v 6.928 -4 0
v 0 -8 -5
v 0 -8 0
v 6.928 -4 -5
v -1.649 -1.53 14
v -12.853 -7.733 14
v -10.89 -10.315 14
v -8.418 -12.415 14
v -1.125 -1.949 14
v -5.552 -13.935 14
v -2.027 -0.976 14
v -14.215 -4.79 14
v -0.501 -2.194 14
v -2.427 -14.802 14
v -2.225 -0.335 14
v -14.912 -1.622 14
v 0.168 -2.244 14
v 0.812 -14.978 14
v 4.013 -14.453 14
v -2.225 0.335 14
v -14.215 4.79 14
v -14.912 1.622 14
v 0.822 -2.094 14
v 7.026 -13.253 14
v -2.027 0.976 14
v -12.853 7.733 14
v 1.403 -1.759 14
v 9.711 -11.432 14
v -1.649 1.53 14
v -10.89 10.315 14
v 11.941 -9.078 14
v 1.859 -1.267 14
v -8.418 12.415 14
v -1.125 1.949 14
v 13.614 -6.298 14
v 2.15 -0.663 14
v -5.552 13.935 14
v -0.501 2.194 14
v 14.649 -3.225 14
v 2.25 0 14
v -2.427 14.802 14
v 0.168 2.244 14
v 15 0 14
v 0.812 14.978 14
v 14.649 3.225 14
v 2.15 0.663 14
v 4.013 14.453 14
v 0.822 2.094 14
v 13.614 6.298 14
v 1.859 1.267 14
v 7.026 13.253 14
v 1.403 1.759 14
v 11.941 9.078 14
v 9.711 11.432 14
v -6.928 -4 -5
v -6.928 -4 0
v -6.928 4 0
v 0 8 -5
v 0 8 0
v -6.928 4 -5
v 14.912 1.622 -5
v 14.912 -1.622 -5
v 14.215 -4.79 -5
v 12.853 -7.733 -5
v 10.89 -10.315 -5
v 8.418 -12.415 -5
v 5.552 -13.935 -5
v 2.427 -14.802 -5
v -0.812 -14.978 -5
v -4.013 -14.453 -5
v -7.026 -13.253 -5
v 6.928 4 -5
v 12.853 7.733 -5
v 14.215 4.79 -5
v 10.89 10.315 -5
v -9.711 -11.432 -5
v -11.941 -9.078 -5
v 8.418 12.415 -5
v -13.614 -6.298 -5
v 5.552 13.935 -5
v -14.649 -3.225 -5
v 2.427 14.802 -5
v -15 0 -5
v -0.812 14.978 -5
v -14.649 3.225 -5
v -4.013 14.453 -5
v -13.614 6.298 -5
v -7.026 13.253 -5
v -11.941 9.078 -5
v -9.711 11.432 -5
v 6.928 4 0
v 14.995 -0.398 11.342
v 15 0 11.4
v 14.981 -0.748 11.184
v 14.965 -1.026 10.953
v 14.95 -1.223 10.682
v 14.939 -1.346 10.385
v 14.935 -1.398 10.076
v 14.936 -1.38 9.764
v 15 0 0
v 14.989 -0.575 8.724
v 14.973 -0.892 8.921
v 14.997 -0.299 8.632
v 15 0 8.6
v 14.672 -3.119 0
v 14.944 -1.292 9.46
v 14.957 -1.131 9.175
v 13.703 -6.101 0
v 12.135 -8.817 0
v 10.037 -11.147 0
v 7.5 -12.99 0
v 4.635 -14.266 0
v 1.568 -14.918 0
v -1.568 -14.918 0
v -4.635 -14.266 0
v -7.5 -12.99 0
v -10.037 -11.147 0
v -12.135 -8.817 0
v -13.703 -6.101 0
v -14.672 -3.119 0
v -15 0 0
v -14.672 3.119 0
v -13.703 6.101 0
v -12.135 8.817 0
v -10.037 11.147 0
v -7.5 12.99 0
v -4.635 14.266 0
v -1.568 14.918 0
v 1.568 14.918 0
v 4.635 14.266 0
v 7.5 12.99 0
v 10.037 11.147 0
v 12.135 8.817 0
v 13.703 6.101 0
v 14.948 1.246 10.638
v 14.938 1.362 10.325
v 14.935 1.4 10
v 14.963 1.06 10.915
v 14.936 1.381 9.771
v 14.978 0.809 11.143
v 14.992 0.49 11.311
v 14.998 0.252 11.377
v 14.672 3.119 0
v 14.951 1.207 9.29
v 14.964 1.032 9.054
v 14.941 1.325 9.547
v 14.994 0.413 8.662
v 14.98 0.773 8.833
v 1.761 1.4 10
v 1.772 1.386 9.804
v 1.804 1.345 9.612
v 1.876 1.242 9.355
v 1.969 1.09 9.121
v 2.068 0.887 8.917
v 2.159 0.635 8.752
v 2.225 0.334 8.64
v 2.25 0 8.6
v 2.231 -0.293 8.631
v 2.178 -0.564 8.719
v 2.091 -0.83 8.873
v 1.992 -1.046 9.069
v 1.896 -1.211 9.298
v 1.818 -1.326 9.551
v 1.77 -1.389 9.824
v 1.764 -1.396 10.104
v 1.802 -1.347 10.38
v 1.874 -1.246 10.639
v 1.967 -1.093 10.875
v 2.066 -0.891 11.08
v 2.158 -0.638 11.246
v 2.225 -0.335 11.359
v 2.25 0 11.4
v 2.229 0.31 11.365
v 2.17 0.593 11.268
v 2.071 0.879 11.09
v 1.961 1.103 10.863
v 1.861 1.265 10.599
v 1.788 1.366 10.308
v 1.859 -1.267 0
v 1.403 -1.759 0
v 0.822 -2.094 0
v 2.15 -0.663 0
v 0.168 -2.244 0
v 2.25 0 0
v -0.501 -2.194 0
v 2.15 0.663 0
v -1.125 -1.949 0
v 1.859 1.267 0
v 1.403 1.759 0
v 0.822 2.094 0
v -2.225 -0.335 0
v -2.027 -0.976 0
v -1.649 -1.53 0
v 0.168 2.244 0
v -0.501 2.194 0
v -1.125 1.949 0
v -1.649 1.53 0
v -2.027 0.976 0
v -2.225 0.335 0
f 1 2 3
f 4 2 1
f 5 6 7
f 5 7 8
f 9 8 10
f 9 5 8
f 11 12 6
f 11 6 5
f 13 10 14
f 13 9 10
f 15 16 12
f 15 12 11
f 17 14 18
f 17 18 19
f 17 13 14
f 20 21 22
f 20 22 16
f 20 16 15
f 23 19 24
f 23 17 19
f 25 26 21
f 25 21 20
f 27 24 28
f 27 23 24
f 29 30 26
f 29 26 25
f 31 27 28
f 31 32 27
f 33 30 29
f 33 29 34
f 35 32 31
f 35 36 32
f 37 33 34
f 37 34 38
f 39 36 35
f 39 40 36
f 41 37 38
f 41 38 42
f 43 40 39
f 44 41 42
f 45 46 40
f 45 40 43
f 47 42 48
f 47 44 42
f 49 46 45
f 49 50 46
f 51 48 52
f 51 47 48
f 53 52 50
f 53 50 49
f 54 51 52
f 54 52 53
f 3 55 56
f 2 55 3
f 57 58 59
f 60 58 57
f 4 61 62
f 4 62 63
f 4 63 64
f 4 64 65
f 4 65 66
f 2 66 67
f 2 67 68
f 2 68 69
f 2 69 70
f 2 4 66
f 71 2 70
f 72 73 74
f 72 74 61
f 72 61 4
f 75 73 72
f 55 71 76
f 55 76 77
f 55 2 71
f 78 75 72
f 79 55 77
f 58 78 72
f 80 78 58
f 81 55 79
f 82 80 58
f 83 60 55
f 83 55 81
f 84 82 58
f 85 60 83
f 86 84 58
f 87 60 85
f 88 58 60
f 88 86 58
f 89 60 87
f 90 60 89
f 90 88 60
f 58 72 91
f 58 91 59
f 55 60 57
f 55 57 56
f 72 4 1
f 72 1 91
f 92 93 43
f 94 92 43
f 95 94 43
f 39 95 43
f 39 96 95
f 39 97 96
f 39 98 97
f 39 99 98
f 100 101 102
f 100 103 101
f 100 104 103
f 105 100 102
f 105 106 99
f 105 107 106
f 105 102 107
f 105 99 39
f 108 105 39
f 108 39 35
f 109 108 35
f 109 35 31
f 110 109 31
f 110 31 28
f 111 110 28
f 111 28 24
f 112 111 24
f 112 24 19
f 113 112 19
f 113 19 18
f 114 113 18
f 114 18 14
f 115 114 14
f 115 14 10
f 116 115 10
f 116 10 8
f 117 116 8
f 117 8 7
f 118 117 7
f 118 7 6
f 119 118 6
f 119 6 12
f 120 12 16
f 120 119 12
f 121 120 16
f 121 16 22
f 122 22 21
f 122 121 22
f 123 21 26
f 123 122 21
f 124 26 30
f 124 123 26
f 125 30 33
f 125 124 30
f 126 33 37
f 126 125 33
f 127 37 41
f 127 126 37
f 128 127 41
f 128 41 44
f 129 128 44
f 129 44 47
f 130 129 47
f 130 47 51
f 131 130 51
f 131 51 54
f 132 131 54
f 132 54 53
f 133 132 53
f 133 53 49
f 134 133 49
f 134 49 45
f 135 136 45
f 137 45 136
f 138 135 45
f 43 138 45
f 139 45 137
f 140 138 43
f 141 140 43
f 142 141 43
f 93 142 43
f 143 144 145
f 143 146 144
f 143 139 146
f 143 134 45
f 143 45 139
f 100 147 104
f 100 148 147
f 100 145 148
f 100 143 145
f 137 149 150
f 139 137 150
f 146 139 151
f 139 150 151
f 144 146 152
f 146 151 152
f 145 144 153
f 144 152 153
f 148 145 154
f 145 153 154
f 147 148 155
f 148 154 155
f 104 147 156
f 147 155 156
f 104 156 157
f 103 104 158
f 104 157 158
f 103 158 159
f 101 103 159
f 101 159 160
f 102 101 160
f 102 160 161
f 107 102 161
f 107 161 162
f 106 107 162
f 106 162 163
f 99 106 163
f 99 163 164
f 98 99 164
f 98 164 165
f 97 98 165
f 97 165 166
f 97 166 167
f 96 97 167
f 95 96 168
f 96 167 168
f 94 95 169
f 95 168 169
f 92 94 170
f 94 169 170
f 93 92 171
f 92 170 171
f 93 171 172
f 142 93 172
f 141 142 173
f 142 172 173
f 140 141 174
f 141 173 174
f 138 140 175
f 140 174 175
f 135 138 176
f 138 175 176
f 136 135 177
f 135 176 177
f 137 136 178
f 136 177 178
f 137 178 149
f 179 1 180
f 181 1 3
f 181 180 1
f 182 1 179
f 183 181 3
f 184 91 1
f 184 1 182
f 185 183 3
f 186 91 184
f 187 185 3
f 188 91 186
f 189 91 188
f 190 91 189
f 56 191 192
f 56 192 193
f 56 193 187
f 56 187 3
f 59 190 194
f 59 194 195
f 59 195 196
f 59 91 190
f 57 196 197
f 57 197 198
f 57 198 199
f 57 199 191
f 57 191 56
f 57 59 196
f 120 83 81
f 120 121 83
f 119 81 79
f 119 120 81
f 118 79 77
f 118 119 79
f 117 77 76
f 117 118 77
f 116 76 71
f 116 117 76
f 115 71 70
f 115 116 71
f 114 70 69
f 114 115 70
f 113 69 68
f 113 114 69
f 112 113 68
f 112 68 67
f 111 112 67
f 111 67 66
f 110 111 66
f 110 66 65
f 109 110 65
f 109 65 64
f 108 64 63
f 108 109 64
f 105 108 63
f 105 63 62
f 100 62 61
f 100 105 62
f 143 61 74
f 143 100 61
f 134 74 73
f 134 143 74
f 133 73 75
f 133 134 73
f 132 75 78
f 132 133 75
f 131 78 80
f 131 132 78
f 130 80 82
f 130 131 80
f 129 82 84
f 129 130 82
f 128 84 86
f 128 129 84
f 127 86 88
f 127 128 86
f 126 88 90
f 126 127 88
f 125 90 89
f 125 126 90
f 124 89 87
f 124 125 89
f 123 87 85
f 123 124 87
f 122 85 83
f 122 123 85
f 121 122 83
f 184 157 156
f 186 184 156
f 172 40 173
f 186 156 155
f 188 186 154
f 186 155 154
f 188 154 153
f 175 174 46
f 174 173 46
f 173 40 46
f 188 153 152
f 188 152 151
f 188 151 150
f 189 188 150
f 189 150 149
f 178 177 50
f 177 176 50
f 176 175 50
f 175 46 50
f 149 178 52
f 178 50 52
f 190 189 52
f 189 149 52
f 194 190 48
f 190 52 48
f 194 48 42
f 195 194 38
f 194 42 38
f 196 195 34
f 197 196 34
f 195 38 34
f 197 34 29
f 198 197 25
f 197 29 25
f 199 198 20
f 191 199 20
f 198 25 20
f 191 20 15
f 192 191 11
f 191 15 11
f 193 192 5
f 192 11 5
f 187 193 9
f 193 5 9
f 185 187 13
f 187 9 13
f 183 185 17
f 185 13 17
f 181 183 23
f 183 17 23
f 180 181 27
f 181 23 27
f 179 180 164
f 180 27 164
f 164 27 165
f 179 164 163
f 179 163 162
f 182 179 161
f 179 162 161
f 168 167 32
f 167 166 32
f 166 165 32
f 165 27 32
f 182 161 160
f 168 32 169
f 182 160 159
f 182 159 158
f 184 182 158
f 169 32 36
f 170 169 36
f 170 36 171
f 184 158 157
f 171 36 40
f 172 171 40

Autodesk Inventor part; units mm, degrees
ref_plane "YZ Plane" through (0, 0, 0) normal (1, 0, 0) x (0, 1, 0)
ref_plane "XZ Plane" through (0, 0, 0) normal (0, 1, 0) x (-1, 0, 0)
ref_plane "XY Plane" through (0, 0, 0) normal (0, 0, 1) x (1, 0, 0)
sketch "Sketch1" plane through (0, 0, 0) normal (0, 0, 1) x (1, 0, 0)
  circle A0 centre (0, 0) radius 15
  dimension "d0" = 30
extrude "Extrusion1" add sketch "Sketch1" along normal blind 14
sketch "Sketch2" plane through (0, 0, 14) normal (0, 0, 1) x (1, 0, 0)
  circle A0 centre (0, 0) radius 2.25
  dimension "d3" = 4.5
extrude "Extrusion2" cut sketch "Sketch2" against normal blind 19
sketch "Sketch3" plane through (0, 0, 0) normal (0, 0, -1) x (-1, 0, 0)
  circle A0 centre (0, 0) radius 15 projected
extrude "Extrusion3" add sketch "Sketch3" along normal blind 5
sketch "Sketch6" plane through (0, 0, -5) normal (0, 0, -1) x (-1, 0, 0)
  line L0 (0, -8) -> (-6.9282, -4)
  line L1 (-6.9282, -4) -> (-6.9282, 4)
  line L2 (-6.9282, 4) -> (0, 8)
  line L3 (0, 8) -> (6.9282, 4)
  line L4 (6.9282, 4) -> (6.9282, -4)
  line L5 (6.9282, -4) -> (0, -8)
  point P0 (0, 0)
  point P1 (0, 0)
  dimension "d15" = 16
extrude "Extrusion6" cut sketch "Sketch6" against normal blind 5
sketch "Sketch7" plane through (0, 0, 0) normal (1, 0, 0) x (0, 1, 0)
  circle A0 centre (0, 10) radius 1.4
  line L0 (15, 14) -> (-15, 14) projected
  point P0 (0, 0)
  dimension "d18" = 2.8
  dimension "d22" = 4
extrude "Extrusion7" cut sketch "Sketch7" along normal through all
properties part number "AA009" material "ABS Plastic"
